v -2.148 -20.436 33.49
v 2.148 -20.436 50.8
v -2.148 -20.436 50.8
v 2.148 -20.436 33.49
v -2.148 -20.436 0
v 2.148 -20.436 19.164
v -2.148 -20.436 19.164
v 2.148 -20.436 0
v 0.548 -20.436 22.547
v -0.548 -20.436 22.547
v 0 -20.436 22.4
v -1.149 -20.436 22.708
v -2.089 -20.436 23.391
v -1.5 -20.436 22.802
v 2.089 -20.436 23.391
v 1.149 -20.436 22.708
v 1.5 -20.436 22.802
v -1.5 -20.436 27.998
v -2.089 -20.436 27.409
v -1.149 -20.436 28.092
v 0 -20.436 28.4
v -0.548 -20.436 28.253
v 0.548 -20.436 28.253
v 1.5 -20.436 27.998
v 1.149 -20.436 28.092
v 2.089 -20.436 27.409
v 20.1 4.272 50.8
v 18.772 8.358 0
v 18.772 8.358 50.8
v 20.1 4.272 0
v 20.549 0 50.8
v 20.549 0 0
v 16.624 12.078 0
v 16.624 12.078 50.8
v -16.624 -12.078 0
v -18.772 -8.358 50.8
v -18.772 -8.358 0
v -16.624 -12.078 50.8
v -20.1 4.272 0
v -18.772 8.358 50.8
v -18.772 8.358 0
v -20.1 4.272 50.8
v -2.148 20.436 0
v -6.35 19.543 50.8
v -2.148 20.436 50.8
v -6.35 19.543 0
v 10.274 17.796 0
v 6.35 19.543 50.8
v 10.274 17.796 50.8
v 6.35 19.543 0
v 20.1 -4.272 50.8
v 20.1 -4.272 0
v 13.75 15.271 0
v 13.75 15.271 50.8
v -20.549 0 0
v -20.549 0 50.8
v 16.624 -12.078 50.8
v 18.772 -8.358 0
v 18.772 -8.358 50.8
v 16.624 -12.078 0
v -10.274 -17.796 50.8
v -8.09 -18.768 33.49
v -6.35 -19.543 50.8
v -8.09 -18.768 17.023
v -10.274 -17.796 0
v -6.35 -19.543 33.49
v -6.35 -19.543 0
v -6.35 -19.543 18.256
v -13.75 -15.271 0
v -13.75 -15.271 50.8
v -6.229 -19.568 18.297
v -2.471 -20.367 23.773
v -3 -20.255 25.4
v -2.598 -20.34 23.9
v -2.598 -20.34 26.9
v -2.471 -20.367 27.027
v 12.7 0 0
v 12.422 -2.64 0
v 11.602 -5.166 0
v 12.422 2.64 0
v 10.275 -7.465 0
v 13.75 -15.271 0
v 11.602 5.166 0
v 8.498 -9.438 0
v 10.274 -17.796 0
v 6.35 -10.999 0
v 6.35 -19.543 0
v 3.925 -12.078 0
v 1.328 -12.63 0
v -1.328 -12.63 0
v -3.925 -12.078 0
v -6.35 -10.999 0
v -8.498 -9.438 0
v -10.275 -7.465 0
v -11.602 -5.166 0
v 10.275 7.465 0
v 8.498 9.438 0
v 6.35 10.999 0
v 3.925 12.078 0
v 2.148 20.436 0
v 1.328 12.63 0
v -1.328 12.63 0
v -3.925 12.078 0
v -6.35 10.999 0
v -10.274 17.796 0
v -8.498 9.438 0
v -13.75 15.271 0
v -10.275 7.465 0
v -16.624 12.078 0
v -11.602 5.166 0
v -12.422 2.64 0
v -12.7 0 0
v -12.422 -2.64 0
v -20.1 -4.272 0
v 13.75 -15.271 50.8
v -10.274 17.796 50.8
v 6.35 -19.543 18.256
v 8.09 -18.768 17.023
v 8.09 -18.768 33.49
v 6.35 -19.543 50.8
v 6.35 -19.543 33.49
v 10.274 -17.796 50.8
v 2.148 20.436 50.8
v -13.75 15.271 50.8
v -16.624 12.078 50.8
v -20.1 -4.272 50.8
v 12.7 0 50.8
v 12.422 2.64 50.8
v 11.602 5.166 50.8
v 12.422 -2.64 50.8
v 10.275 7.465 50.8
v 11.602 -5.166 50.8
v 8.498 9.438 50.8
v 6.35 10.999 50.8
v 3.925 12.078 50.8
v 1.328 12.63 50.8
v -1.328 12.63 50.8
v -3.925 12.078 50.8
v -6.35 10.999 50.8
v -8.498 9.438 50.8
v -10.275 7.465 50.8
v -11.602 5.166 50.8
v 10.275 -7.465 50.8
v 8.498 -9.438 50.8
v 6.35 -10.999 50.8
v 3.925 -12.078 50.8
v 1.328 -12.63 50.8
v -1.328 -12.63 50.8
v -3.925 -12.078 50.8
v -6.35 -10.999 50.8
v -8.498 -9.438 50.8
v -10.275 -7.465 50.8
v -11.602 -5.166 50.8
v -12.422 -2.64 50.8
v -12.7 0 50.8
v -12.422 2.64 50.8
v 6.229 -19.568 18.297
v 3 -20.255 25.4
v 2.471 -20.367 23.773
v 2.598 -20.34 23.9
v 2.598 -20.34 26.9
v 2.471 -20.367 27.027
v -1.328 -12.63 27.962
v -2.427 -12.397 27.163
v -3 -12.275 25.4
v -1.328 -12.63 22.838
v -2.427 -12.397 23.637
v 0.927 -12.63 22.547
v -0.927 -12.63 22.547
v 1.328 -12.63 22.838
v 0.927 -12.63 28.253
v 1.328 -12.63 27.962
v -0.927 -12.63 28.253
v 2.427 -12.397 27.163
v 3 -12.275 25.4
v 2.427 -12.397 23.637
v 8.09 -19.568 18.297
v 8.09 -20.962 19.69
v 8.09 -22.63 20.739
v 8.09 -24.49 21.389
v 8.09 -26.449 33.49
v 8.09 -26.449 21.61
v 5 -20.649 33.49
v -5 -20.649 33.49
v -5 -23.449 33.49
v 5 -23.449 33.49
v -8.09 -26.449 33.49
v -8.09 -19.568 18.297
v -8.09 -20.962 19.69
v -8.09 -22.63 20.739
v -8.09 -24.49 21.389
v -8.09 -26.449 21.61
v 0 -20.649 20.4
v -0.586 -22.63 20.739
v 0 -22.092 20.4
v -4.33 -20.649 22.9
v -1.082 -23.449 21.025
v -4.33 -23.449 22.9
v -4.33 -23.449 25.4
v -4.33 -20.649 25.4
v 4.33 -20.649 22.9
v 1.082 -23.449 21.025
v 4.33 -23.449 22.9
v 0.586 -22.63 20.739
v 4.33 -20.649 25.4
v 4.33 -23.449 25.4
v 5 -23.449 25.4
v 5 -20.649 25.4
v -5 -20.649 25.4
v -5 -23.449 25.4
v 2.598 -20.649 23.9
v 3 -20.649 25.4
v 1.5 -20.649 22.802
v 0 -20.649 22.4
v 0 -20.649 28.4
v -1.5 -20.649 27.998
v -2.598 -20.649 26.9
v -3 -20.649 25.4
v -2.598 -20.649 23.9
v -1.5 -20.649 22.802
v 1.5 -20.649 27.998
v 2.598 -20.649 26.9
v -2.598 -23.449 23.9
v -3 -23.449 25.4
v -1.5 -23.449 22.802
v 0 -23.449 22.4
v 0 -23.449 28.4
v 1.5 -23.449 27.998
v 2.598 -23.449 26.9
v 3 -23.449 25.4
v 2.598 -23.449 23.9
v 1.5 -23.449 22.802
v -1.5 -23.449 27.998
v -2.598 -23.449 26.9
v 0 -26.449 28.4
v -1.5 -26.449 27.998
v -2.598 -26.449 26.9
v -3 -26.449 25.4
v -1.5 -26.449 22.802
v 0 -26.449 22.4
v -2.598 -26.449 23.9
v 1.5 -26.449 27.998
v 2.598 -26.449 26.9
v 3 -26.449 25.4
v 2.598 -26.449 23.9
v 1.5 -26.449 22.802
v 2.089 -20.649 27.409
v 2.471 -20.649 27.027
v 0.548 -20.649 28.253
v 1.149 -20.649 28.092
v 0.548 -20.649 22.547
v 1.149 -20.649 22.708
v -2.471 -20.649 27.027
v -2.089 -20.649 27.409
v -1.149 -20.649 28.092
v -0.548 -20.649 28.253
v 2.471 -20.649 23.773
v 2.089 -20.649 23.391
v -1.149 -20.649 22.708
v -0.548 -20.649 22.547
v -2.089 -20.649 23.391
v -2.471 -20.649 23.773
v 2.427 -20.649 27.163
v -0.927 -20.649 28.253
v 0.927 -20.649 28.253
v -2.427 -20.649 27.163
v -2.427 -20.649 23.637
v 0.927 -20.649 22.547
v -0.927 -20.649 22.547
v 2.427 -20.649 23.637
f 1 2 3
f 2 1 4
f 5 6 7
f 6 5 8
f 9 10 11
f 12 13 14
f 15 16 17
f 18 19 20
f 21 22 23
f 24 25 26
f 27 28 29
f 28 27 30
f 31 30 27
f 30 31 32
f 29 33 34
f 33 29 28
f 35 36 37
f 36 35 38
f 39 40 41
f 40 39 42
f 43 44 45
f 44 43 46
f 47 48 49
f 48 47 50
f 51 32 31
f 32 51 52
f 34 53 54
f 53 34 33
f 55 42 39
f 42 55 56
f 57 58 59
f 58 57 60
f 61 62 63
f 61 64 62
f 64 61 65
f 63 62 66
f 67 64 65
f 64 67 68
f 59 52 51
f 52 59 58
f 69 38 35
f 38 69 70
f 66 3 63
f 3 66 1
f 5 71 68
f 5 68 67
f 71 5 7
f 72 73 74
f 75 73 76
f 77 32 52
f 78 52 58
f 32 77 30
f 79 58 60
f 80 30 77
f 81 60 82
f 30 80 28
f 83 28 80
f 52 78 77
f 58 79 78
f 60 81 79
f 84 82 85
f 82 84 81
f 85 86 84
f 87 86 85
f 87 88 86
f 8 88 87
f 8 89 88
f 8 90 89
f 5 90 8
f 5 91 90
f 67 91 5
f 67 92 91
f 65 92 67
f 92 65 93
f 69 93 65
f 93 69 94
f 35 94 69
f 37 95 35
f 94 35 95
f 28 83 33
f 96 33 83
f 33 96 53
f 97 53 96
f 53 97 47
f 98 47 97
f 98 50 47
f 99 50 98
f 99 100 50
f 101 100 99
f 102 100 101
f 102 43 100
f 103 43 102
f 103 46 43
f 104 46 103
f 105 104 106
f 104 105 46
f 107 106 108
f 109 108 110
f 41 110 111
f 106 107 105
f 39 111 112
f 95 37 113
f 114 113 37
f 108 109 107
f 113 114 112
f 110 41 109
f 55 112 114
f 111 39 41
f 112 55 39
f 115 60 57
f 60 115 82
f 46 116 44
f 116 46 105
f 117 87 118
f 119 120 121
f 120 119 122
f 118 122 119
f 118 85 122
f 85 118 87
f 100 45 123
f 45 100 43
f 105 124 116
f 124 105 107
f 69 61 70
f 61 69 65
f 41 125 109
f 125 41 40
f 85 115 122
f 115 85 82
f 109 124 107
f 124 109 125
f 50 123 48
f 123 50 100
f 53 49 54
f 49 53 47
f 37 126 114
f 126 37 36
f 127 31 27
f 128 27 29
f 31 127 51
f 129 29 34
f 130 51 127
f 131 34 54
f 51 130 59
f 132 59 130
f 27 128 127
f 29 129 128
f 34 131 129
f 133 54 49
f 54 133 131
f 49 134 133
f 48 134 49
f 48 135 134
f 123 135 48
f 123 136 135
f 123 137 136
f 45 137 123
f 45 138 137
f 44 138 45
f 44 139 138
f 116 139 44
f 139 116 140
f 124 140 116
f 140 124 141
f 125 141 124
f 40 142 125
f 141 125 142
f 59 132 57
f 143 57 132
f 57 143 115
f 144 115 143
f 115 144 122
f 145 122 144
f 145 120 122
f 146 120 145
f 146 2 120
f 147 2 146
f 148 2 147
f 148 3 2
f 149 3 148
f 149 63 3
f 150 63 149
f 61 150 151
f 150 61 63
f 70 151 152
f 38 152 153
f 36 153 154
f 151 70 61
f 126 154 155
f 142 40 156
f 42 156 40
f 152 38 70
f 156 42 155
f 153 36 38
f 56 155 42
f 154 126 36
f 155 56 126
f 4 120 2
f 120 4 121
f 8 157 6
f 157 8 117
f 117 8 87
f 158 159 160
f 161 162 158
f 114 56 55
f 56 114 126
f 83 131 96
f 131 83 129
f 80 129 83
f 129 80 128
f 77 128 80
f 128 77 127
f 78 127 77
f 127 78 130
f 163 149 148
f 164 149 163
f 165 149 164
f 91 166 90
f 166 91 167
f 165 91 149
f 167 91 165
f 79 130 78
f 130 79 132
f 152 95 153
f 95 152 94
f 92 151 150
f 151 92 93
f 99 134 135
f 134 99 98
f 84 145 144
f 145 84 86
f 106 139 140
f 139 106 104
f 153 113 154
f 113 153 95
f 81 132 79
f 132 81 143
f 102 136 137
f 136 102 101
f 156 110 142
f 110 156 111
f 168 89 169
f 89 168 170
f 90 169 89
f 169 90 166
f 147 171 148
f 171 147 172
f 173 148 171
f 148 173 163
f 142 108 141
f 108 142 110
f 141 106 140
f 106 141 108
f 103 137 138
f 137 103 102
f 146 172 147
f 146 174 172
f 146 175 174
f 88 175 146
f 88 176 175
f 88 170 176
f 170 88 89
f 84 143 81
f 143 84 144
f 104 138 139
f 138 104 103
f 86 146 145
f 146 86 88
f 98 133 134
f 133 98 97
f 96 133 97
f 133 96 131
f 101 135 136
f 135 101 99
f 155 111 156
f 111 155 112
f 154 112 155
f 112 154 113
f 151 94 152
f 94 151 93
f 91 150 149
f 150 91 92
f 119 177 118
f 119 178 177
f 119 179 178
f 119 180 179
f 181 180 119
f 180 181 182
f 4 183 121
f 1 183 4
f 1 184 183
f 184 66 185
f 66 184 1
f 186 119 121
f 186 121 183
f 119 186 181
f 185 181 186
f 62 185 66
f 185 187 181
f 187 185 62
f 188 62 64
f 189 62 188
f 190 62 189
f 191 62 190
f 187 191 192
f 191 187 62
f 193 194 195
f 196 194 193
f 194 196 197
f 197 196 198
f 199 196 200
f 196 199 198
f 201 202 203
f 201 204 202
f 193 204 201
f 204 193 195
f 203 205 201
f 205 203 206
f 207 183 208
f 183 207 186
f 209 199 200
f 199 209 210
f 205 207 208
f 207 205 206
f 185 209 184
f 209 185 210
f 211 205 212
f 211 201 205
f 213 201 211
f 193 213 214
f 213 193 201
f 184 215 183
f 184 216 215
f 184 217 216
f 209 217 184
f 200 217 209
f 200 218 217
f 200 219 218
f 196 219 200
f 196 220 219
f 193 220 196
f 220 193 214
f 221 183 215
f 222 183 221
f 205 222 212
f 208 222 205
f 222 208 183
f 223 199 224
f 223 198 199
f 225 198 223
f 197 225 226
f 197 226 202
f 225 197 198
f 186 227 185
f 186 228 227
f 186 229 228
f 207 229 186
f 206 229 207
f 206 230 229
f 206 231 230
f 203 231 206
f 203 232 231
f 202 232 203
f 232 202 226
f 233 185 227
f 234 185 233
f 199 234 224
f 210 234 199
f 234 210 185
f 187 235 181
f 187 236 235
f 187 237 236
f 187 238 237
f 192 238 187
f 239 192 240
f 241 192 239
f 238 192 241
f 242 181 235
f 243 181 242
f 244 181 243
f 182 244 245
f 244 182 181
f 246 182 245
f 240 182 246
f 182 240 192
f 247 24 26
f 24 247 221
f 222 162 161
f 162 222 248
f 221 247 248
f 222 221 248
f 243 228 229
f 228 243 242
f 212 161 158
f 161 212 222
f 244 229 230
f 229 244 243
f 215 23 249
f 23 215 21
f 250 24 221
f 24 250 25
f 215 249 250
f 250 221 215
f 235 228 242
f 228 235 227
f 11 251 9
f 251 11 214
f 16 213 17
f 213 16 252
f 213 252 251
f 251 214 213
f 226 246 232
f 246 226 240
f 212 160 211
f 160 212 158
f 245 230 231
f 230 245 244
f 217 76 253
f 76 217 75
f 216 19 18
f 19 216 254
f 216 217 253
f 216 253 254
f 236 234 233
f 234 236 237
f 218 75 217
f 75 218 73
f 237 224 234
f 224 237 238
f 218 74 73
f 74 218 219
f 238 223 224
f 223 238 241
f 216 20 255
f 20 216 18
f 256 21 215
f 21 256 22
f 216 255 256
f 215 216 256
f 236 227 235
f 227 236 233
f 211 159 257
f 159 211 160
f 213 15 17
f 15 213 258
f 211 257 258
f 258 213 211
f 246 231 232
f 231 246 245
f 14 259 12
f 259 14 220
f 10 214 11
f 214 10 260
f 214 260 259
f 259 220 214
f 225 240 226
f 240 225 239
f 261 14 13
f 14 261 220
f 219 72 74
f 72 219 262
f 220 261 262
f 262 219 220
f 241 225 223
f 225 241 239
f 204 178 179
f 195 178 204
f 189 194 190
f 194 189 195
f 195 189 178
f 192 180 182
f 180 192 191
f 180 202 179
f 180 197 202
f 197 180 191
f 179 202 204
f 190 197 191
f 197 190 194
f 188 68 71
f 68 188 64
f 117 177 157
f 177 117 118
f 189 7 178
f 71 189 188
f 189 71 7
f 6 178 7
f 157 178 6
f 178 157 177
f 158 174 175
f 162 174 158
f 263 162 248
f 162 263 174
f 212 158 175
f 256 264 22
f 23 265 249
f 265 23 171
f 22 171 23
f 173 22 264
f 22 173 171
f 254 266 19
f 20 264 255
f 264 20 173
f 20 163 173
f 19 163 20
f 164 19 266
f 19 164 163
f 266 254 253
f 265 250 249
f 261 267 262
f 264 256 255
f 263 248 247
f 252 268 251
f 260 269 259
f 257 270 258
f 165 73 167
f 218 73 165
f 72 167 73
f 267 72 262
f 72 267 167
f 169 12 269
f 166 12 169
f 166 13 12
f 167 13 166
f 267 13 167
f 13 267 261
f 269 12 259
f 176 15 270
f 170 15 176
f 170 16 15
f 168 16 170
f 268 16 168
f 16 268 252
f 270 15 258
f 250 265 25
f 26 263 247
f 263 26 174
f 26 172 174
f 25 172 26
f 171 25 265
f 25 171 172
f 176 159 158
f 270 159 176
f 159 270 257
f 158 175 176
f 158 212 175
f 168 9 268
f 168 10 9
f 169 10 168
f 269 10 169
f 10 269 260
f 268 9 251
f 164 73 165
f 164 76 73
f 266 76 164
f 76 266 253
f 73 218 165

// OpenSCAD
/*
	By: William A Adams
	http://williamaadams.wordpress.com
*/

joinfactor = 0.1;
goldenratio = 1.618;

//nutslot(OR=6, facets=6, thickness=3, scaler=goldenratio);
//nuthatch(IR=3, OR=6, facets=6, thickness=3, fillet=true);
connector(IR=1/2*25.4, length = 2*25.4);

//================================================
//  Component Routines
//================================================
module tube(IR, OR, height)
{
	difference()
	{
		cylinder(r=OR, h=height);

		translate([0,0,-joinfactor])
		cylinder(r=IR, h=height+joinfactor*2);
	}
}

module nutslot(OR, facets=6, thickness=3, scaler=goldenratio)
{
	size = OR *2* scaler;

	difference()
	{
		cube(size=[size, thickness, size], center=true);
	
		rotate([90, 90, 0])
		cylinder(r=OR, h=thickness+2*joinfactor, center=true, $fn=facets);

		translate([0, 0, OR])
		cube(size=[OR*2, thickness+2*joinfactor, OR*2], center=true);
	}
}

/*
	Take the nutslot, and put it in a sandwhich
*/
module nuthatch(IR, OR, facets=6, thickness=3, fillet=false)
{
	size = OR*2*goldenratio;
	filletdepth = (thickness*3-joinfactor*2);
	filletheight =  (thickness*3-joinfactor*2)/2;

	difference()
	{
		union()
		{
			translate([0, +thickness-joinfactor, 0])
			cube(size=[size, thickness, size], center=true);
			
			nutslot(OR, facets, thickness, goldenratio);
		
			translate([0, -thickness+joinfactor, 0])
			cube(size=[size, thickness, size], center=true);

			if (fillet)
			{
				translate([0, 0, -filletheight/2-size/2+joinfactor])
				cube(size=[size, filletdepth, filletheight], center=true);
			}
		}

		rotate([90, 0, 0])
		cylinder(r=IR, h=thickness*3+joinfactor*2, center=true, $fn=12);

		if (fillet)
		{
			translate([0, -(thickness*3-joinfactor*2)/2, -size/2-thickness*3/2])
			rotate([0,90,0])
			cylinder(r=filletdepth, h = size+joinfactor*2, center=true);
		}
	}
}

/*
	Mate the nuthatch on the side of a tube
*/
module connector(IR, length)
{
	OR = IR*goldenratio;
	thickness = OR - IR;

	nutIR = 3;
	nutOR = 5;
	nutFacets = 6;
	nutThickness = 3;

	nuthatchsize = nutOR*2*goldenratio;

	difference()
	{
		union()
		{
			tube(IR, OR, height = length);
	
			translate([0, -nutThickness/2-nutThickness-OR+nutThickness, length/2])
			nuthatch(IR=nutIR, OR = nutOR, facets=nutFacets, thickness=nutThickness, fillet=true);
		}

		// Cut a hole all the way through to the pipe
		translate([0,0,length/2])
		rotate([90, 0, 0])
		cylinder(r=nutIR, h=OR+joinfactor);
	}
}
